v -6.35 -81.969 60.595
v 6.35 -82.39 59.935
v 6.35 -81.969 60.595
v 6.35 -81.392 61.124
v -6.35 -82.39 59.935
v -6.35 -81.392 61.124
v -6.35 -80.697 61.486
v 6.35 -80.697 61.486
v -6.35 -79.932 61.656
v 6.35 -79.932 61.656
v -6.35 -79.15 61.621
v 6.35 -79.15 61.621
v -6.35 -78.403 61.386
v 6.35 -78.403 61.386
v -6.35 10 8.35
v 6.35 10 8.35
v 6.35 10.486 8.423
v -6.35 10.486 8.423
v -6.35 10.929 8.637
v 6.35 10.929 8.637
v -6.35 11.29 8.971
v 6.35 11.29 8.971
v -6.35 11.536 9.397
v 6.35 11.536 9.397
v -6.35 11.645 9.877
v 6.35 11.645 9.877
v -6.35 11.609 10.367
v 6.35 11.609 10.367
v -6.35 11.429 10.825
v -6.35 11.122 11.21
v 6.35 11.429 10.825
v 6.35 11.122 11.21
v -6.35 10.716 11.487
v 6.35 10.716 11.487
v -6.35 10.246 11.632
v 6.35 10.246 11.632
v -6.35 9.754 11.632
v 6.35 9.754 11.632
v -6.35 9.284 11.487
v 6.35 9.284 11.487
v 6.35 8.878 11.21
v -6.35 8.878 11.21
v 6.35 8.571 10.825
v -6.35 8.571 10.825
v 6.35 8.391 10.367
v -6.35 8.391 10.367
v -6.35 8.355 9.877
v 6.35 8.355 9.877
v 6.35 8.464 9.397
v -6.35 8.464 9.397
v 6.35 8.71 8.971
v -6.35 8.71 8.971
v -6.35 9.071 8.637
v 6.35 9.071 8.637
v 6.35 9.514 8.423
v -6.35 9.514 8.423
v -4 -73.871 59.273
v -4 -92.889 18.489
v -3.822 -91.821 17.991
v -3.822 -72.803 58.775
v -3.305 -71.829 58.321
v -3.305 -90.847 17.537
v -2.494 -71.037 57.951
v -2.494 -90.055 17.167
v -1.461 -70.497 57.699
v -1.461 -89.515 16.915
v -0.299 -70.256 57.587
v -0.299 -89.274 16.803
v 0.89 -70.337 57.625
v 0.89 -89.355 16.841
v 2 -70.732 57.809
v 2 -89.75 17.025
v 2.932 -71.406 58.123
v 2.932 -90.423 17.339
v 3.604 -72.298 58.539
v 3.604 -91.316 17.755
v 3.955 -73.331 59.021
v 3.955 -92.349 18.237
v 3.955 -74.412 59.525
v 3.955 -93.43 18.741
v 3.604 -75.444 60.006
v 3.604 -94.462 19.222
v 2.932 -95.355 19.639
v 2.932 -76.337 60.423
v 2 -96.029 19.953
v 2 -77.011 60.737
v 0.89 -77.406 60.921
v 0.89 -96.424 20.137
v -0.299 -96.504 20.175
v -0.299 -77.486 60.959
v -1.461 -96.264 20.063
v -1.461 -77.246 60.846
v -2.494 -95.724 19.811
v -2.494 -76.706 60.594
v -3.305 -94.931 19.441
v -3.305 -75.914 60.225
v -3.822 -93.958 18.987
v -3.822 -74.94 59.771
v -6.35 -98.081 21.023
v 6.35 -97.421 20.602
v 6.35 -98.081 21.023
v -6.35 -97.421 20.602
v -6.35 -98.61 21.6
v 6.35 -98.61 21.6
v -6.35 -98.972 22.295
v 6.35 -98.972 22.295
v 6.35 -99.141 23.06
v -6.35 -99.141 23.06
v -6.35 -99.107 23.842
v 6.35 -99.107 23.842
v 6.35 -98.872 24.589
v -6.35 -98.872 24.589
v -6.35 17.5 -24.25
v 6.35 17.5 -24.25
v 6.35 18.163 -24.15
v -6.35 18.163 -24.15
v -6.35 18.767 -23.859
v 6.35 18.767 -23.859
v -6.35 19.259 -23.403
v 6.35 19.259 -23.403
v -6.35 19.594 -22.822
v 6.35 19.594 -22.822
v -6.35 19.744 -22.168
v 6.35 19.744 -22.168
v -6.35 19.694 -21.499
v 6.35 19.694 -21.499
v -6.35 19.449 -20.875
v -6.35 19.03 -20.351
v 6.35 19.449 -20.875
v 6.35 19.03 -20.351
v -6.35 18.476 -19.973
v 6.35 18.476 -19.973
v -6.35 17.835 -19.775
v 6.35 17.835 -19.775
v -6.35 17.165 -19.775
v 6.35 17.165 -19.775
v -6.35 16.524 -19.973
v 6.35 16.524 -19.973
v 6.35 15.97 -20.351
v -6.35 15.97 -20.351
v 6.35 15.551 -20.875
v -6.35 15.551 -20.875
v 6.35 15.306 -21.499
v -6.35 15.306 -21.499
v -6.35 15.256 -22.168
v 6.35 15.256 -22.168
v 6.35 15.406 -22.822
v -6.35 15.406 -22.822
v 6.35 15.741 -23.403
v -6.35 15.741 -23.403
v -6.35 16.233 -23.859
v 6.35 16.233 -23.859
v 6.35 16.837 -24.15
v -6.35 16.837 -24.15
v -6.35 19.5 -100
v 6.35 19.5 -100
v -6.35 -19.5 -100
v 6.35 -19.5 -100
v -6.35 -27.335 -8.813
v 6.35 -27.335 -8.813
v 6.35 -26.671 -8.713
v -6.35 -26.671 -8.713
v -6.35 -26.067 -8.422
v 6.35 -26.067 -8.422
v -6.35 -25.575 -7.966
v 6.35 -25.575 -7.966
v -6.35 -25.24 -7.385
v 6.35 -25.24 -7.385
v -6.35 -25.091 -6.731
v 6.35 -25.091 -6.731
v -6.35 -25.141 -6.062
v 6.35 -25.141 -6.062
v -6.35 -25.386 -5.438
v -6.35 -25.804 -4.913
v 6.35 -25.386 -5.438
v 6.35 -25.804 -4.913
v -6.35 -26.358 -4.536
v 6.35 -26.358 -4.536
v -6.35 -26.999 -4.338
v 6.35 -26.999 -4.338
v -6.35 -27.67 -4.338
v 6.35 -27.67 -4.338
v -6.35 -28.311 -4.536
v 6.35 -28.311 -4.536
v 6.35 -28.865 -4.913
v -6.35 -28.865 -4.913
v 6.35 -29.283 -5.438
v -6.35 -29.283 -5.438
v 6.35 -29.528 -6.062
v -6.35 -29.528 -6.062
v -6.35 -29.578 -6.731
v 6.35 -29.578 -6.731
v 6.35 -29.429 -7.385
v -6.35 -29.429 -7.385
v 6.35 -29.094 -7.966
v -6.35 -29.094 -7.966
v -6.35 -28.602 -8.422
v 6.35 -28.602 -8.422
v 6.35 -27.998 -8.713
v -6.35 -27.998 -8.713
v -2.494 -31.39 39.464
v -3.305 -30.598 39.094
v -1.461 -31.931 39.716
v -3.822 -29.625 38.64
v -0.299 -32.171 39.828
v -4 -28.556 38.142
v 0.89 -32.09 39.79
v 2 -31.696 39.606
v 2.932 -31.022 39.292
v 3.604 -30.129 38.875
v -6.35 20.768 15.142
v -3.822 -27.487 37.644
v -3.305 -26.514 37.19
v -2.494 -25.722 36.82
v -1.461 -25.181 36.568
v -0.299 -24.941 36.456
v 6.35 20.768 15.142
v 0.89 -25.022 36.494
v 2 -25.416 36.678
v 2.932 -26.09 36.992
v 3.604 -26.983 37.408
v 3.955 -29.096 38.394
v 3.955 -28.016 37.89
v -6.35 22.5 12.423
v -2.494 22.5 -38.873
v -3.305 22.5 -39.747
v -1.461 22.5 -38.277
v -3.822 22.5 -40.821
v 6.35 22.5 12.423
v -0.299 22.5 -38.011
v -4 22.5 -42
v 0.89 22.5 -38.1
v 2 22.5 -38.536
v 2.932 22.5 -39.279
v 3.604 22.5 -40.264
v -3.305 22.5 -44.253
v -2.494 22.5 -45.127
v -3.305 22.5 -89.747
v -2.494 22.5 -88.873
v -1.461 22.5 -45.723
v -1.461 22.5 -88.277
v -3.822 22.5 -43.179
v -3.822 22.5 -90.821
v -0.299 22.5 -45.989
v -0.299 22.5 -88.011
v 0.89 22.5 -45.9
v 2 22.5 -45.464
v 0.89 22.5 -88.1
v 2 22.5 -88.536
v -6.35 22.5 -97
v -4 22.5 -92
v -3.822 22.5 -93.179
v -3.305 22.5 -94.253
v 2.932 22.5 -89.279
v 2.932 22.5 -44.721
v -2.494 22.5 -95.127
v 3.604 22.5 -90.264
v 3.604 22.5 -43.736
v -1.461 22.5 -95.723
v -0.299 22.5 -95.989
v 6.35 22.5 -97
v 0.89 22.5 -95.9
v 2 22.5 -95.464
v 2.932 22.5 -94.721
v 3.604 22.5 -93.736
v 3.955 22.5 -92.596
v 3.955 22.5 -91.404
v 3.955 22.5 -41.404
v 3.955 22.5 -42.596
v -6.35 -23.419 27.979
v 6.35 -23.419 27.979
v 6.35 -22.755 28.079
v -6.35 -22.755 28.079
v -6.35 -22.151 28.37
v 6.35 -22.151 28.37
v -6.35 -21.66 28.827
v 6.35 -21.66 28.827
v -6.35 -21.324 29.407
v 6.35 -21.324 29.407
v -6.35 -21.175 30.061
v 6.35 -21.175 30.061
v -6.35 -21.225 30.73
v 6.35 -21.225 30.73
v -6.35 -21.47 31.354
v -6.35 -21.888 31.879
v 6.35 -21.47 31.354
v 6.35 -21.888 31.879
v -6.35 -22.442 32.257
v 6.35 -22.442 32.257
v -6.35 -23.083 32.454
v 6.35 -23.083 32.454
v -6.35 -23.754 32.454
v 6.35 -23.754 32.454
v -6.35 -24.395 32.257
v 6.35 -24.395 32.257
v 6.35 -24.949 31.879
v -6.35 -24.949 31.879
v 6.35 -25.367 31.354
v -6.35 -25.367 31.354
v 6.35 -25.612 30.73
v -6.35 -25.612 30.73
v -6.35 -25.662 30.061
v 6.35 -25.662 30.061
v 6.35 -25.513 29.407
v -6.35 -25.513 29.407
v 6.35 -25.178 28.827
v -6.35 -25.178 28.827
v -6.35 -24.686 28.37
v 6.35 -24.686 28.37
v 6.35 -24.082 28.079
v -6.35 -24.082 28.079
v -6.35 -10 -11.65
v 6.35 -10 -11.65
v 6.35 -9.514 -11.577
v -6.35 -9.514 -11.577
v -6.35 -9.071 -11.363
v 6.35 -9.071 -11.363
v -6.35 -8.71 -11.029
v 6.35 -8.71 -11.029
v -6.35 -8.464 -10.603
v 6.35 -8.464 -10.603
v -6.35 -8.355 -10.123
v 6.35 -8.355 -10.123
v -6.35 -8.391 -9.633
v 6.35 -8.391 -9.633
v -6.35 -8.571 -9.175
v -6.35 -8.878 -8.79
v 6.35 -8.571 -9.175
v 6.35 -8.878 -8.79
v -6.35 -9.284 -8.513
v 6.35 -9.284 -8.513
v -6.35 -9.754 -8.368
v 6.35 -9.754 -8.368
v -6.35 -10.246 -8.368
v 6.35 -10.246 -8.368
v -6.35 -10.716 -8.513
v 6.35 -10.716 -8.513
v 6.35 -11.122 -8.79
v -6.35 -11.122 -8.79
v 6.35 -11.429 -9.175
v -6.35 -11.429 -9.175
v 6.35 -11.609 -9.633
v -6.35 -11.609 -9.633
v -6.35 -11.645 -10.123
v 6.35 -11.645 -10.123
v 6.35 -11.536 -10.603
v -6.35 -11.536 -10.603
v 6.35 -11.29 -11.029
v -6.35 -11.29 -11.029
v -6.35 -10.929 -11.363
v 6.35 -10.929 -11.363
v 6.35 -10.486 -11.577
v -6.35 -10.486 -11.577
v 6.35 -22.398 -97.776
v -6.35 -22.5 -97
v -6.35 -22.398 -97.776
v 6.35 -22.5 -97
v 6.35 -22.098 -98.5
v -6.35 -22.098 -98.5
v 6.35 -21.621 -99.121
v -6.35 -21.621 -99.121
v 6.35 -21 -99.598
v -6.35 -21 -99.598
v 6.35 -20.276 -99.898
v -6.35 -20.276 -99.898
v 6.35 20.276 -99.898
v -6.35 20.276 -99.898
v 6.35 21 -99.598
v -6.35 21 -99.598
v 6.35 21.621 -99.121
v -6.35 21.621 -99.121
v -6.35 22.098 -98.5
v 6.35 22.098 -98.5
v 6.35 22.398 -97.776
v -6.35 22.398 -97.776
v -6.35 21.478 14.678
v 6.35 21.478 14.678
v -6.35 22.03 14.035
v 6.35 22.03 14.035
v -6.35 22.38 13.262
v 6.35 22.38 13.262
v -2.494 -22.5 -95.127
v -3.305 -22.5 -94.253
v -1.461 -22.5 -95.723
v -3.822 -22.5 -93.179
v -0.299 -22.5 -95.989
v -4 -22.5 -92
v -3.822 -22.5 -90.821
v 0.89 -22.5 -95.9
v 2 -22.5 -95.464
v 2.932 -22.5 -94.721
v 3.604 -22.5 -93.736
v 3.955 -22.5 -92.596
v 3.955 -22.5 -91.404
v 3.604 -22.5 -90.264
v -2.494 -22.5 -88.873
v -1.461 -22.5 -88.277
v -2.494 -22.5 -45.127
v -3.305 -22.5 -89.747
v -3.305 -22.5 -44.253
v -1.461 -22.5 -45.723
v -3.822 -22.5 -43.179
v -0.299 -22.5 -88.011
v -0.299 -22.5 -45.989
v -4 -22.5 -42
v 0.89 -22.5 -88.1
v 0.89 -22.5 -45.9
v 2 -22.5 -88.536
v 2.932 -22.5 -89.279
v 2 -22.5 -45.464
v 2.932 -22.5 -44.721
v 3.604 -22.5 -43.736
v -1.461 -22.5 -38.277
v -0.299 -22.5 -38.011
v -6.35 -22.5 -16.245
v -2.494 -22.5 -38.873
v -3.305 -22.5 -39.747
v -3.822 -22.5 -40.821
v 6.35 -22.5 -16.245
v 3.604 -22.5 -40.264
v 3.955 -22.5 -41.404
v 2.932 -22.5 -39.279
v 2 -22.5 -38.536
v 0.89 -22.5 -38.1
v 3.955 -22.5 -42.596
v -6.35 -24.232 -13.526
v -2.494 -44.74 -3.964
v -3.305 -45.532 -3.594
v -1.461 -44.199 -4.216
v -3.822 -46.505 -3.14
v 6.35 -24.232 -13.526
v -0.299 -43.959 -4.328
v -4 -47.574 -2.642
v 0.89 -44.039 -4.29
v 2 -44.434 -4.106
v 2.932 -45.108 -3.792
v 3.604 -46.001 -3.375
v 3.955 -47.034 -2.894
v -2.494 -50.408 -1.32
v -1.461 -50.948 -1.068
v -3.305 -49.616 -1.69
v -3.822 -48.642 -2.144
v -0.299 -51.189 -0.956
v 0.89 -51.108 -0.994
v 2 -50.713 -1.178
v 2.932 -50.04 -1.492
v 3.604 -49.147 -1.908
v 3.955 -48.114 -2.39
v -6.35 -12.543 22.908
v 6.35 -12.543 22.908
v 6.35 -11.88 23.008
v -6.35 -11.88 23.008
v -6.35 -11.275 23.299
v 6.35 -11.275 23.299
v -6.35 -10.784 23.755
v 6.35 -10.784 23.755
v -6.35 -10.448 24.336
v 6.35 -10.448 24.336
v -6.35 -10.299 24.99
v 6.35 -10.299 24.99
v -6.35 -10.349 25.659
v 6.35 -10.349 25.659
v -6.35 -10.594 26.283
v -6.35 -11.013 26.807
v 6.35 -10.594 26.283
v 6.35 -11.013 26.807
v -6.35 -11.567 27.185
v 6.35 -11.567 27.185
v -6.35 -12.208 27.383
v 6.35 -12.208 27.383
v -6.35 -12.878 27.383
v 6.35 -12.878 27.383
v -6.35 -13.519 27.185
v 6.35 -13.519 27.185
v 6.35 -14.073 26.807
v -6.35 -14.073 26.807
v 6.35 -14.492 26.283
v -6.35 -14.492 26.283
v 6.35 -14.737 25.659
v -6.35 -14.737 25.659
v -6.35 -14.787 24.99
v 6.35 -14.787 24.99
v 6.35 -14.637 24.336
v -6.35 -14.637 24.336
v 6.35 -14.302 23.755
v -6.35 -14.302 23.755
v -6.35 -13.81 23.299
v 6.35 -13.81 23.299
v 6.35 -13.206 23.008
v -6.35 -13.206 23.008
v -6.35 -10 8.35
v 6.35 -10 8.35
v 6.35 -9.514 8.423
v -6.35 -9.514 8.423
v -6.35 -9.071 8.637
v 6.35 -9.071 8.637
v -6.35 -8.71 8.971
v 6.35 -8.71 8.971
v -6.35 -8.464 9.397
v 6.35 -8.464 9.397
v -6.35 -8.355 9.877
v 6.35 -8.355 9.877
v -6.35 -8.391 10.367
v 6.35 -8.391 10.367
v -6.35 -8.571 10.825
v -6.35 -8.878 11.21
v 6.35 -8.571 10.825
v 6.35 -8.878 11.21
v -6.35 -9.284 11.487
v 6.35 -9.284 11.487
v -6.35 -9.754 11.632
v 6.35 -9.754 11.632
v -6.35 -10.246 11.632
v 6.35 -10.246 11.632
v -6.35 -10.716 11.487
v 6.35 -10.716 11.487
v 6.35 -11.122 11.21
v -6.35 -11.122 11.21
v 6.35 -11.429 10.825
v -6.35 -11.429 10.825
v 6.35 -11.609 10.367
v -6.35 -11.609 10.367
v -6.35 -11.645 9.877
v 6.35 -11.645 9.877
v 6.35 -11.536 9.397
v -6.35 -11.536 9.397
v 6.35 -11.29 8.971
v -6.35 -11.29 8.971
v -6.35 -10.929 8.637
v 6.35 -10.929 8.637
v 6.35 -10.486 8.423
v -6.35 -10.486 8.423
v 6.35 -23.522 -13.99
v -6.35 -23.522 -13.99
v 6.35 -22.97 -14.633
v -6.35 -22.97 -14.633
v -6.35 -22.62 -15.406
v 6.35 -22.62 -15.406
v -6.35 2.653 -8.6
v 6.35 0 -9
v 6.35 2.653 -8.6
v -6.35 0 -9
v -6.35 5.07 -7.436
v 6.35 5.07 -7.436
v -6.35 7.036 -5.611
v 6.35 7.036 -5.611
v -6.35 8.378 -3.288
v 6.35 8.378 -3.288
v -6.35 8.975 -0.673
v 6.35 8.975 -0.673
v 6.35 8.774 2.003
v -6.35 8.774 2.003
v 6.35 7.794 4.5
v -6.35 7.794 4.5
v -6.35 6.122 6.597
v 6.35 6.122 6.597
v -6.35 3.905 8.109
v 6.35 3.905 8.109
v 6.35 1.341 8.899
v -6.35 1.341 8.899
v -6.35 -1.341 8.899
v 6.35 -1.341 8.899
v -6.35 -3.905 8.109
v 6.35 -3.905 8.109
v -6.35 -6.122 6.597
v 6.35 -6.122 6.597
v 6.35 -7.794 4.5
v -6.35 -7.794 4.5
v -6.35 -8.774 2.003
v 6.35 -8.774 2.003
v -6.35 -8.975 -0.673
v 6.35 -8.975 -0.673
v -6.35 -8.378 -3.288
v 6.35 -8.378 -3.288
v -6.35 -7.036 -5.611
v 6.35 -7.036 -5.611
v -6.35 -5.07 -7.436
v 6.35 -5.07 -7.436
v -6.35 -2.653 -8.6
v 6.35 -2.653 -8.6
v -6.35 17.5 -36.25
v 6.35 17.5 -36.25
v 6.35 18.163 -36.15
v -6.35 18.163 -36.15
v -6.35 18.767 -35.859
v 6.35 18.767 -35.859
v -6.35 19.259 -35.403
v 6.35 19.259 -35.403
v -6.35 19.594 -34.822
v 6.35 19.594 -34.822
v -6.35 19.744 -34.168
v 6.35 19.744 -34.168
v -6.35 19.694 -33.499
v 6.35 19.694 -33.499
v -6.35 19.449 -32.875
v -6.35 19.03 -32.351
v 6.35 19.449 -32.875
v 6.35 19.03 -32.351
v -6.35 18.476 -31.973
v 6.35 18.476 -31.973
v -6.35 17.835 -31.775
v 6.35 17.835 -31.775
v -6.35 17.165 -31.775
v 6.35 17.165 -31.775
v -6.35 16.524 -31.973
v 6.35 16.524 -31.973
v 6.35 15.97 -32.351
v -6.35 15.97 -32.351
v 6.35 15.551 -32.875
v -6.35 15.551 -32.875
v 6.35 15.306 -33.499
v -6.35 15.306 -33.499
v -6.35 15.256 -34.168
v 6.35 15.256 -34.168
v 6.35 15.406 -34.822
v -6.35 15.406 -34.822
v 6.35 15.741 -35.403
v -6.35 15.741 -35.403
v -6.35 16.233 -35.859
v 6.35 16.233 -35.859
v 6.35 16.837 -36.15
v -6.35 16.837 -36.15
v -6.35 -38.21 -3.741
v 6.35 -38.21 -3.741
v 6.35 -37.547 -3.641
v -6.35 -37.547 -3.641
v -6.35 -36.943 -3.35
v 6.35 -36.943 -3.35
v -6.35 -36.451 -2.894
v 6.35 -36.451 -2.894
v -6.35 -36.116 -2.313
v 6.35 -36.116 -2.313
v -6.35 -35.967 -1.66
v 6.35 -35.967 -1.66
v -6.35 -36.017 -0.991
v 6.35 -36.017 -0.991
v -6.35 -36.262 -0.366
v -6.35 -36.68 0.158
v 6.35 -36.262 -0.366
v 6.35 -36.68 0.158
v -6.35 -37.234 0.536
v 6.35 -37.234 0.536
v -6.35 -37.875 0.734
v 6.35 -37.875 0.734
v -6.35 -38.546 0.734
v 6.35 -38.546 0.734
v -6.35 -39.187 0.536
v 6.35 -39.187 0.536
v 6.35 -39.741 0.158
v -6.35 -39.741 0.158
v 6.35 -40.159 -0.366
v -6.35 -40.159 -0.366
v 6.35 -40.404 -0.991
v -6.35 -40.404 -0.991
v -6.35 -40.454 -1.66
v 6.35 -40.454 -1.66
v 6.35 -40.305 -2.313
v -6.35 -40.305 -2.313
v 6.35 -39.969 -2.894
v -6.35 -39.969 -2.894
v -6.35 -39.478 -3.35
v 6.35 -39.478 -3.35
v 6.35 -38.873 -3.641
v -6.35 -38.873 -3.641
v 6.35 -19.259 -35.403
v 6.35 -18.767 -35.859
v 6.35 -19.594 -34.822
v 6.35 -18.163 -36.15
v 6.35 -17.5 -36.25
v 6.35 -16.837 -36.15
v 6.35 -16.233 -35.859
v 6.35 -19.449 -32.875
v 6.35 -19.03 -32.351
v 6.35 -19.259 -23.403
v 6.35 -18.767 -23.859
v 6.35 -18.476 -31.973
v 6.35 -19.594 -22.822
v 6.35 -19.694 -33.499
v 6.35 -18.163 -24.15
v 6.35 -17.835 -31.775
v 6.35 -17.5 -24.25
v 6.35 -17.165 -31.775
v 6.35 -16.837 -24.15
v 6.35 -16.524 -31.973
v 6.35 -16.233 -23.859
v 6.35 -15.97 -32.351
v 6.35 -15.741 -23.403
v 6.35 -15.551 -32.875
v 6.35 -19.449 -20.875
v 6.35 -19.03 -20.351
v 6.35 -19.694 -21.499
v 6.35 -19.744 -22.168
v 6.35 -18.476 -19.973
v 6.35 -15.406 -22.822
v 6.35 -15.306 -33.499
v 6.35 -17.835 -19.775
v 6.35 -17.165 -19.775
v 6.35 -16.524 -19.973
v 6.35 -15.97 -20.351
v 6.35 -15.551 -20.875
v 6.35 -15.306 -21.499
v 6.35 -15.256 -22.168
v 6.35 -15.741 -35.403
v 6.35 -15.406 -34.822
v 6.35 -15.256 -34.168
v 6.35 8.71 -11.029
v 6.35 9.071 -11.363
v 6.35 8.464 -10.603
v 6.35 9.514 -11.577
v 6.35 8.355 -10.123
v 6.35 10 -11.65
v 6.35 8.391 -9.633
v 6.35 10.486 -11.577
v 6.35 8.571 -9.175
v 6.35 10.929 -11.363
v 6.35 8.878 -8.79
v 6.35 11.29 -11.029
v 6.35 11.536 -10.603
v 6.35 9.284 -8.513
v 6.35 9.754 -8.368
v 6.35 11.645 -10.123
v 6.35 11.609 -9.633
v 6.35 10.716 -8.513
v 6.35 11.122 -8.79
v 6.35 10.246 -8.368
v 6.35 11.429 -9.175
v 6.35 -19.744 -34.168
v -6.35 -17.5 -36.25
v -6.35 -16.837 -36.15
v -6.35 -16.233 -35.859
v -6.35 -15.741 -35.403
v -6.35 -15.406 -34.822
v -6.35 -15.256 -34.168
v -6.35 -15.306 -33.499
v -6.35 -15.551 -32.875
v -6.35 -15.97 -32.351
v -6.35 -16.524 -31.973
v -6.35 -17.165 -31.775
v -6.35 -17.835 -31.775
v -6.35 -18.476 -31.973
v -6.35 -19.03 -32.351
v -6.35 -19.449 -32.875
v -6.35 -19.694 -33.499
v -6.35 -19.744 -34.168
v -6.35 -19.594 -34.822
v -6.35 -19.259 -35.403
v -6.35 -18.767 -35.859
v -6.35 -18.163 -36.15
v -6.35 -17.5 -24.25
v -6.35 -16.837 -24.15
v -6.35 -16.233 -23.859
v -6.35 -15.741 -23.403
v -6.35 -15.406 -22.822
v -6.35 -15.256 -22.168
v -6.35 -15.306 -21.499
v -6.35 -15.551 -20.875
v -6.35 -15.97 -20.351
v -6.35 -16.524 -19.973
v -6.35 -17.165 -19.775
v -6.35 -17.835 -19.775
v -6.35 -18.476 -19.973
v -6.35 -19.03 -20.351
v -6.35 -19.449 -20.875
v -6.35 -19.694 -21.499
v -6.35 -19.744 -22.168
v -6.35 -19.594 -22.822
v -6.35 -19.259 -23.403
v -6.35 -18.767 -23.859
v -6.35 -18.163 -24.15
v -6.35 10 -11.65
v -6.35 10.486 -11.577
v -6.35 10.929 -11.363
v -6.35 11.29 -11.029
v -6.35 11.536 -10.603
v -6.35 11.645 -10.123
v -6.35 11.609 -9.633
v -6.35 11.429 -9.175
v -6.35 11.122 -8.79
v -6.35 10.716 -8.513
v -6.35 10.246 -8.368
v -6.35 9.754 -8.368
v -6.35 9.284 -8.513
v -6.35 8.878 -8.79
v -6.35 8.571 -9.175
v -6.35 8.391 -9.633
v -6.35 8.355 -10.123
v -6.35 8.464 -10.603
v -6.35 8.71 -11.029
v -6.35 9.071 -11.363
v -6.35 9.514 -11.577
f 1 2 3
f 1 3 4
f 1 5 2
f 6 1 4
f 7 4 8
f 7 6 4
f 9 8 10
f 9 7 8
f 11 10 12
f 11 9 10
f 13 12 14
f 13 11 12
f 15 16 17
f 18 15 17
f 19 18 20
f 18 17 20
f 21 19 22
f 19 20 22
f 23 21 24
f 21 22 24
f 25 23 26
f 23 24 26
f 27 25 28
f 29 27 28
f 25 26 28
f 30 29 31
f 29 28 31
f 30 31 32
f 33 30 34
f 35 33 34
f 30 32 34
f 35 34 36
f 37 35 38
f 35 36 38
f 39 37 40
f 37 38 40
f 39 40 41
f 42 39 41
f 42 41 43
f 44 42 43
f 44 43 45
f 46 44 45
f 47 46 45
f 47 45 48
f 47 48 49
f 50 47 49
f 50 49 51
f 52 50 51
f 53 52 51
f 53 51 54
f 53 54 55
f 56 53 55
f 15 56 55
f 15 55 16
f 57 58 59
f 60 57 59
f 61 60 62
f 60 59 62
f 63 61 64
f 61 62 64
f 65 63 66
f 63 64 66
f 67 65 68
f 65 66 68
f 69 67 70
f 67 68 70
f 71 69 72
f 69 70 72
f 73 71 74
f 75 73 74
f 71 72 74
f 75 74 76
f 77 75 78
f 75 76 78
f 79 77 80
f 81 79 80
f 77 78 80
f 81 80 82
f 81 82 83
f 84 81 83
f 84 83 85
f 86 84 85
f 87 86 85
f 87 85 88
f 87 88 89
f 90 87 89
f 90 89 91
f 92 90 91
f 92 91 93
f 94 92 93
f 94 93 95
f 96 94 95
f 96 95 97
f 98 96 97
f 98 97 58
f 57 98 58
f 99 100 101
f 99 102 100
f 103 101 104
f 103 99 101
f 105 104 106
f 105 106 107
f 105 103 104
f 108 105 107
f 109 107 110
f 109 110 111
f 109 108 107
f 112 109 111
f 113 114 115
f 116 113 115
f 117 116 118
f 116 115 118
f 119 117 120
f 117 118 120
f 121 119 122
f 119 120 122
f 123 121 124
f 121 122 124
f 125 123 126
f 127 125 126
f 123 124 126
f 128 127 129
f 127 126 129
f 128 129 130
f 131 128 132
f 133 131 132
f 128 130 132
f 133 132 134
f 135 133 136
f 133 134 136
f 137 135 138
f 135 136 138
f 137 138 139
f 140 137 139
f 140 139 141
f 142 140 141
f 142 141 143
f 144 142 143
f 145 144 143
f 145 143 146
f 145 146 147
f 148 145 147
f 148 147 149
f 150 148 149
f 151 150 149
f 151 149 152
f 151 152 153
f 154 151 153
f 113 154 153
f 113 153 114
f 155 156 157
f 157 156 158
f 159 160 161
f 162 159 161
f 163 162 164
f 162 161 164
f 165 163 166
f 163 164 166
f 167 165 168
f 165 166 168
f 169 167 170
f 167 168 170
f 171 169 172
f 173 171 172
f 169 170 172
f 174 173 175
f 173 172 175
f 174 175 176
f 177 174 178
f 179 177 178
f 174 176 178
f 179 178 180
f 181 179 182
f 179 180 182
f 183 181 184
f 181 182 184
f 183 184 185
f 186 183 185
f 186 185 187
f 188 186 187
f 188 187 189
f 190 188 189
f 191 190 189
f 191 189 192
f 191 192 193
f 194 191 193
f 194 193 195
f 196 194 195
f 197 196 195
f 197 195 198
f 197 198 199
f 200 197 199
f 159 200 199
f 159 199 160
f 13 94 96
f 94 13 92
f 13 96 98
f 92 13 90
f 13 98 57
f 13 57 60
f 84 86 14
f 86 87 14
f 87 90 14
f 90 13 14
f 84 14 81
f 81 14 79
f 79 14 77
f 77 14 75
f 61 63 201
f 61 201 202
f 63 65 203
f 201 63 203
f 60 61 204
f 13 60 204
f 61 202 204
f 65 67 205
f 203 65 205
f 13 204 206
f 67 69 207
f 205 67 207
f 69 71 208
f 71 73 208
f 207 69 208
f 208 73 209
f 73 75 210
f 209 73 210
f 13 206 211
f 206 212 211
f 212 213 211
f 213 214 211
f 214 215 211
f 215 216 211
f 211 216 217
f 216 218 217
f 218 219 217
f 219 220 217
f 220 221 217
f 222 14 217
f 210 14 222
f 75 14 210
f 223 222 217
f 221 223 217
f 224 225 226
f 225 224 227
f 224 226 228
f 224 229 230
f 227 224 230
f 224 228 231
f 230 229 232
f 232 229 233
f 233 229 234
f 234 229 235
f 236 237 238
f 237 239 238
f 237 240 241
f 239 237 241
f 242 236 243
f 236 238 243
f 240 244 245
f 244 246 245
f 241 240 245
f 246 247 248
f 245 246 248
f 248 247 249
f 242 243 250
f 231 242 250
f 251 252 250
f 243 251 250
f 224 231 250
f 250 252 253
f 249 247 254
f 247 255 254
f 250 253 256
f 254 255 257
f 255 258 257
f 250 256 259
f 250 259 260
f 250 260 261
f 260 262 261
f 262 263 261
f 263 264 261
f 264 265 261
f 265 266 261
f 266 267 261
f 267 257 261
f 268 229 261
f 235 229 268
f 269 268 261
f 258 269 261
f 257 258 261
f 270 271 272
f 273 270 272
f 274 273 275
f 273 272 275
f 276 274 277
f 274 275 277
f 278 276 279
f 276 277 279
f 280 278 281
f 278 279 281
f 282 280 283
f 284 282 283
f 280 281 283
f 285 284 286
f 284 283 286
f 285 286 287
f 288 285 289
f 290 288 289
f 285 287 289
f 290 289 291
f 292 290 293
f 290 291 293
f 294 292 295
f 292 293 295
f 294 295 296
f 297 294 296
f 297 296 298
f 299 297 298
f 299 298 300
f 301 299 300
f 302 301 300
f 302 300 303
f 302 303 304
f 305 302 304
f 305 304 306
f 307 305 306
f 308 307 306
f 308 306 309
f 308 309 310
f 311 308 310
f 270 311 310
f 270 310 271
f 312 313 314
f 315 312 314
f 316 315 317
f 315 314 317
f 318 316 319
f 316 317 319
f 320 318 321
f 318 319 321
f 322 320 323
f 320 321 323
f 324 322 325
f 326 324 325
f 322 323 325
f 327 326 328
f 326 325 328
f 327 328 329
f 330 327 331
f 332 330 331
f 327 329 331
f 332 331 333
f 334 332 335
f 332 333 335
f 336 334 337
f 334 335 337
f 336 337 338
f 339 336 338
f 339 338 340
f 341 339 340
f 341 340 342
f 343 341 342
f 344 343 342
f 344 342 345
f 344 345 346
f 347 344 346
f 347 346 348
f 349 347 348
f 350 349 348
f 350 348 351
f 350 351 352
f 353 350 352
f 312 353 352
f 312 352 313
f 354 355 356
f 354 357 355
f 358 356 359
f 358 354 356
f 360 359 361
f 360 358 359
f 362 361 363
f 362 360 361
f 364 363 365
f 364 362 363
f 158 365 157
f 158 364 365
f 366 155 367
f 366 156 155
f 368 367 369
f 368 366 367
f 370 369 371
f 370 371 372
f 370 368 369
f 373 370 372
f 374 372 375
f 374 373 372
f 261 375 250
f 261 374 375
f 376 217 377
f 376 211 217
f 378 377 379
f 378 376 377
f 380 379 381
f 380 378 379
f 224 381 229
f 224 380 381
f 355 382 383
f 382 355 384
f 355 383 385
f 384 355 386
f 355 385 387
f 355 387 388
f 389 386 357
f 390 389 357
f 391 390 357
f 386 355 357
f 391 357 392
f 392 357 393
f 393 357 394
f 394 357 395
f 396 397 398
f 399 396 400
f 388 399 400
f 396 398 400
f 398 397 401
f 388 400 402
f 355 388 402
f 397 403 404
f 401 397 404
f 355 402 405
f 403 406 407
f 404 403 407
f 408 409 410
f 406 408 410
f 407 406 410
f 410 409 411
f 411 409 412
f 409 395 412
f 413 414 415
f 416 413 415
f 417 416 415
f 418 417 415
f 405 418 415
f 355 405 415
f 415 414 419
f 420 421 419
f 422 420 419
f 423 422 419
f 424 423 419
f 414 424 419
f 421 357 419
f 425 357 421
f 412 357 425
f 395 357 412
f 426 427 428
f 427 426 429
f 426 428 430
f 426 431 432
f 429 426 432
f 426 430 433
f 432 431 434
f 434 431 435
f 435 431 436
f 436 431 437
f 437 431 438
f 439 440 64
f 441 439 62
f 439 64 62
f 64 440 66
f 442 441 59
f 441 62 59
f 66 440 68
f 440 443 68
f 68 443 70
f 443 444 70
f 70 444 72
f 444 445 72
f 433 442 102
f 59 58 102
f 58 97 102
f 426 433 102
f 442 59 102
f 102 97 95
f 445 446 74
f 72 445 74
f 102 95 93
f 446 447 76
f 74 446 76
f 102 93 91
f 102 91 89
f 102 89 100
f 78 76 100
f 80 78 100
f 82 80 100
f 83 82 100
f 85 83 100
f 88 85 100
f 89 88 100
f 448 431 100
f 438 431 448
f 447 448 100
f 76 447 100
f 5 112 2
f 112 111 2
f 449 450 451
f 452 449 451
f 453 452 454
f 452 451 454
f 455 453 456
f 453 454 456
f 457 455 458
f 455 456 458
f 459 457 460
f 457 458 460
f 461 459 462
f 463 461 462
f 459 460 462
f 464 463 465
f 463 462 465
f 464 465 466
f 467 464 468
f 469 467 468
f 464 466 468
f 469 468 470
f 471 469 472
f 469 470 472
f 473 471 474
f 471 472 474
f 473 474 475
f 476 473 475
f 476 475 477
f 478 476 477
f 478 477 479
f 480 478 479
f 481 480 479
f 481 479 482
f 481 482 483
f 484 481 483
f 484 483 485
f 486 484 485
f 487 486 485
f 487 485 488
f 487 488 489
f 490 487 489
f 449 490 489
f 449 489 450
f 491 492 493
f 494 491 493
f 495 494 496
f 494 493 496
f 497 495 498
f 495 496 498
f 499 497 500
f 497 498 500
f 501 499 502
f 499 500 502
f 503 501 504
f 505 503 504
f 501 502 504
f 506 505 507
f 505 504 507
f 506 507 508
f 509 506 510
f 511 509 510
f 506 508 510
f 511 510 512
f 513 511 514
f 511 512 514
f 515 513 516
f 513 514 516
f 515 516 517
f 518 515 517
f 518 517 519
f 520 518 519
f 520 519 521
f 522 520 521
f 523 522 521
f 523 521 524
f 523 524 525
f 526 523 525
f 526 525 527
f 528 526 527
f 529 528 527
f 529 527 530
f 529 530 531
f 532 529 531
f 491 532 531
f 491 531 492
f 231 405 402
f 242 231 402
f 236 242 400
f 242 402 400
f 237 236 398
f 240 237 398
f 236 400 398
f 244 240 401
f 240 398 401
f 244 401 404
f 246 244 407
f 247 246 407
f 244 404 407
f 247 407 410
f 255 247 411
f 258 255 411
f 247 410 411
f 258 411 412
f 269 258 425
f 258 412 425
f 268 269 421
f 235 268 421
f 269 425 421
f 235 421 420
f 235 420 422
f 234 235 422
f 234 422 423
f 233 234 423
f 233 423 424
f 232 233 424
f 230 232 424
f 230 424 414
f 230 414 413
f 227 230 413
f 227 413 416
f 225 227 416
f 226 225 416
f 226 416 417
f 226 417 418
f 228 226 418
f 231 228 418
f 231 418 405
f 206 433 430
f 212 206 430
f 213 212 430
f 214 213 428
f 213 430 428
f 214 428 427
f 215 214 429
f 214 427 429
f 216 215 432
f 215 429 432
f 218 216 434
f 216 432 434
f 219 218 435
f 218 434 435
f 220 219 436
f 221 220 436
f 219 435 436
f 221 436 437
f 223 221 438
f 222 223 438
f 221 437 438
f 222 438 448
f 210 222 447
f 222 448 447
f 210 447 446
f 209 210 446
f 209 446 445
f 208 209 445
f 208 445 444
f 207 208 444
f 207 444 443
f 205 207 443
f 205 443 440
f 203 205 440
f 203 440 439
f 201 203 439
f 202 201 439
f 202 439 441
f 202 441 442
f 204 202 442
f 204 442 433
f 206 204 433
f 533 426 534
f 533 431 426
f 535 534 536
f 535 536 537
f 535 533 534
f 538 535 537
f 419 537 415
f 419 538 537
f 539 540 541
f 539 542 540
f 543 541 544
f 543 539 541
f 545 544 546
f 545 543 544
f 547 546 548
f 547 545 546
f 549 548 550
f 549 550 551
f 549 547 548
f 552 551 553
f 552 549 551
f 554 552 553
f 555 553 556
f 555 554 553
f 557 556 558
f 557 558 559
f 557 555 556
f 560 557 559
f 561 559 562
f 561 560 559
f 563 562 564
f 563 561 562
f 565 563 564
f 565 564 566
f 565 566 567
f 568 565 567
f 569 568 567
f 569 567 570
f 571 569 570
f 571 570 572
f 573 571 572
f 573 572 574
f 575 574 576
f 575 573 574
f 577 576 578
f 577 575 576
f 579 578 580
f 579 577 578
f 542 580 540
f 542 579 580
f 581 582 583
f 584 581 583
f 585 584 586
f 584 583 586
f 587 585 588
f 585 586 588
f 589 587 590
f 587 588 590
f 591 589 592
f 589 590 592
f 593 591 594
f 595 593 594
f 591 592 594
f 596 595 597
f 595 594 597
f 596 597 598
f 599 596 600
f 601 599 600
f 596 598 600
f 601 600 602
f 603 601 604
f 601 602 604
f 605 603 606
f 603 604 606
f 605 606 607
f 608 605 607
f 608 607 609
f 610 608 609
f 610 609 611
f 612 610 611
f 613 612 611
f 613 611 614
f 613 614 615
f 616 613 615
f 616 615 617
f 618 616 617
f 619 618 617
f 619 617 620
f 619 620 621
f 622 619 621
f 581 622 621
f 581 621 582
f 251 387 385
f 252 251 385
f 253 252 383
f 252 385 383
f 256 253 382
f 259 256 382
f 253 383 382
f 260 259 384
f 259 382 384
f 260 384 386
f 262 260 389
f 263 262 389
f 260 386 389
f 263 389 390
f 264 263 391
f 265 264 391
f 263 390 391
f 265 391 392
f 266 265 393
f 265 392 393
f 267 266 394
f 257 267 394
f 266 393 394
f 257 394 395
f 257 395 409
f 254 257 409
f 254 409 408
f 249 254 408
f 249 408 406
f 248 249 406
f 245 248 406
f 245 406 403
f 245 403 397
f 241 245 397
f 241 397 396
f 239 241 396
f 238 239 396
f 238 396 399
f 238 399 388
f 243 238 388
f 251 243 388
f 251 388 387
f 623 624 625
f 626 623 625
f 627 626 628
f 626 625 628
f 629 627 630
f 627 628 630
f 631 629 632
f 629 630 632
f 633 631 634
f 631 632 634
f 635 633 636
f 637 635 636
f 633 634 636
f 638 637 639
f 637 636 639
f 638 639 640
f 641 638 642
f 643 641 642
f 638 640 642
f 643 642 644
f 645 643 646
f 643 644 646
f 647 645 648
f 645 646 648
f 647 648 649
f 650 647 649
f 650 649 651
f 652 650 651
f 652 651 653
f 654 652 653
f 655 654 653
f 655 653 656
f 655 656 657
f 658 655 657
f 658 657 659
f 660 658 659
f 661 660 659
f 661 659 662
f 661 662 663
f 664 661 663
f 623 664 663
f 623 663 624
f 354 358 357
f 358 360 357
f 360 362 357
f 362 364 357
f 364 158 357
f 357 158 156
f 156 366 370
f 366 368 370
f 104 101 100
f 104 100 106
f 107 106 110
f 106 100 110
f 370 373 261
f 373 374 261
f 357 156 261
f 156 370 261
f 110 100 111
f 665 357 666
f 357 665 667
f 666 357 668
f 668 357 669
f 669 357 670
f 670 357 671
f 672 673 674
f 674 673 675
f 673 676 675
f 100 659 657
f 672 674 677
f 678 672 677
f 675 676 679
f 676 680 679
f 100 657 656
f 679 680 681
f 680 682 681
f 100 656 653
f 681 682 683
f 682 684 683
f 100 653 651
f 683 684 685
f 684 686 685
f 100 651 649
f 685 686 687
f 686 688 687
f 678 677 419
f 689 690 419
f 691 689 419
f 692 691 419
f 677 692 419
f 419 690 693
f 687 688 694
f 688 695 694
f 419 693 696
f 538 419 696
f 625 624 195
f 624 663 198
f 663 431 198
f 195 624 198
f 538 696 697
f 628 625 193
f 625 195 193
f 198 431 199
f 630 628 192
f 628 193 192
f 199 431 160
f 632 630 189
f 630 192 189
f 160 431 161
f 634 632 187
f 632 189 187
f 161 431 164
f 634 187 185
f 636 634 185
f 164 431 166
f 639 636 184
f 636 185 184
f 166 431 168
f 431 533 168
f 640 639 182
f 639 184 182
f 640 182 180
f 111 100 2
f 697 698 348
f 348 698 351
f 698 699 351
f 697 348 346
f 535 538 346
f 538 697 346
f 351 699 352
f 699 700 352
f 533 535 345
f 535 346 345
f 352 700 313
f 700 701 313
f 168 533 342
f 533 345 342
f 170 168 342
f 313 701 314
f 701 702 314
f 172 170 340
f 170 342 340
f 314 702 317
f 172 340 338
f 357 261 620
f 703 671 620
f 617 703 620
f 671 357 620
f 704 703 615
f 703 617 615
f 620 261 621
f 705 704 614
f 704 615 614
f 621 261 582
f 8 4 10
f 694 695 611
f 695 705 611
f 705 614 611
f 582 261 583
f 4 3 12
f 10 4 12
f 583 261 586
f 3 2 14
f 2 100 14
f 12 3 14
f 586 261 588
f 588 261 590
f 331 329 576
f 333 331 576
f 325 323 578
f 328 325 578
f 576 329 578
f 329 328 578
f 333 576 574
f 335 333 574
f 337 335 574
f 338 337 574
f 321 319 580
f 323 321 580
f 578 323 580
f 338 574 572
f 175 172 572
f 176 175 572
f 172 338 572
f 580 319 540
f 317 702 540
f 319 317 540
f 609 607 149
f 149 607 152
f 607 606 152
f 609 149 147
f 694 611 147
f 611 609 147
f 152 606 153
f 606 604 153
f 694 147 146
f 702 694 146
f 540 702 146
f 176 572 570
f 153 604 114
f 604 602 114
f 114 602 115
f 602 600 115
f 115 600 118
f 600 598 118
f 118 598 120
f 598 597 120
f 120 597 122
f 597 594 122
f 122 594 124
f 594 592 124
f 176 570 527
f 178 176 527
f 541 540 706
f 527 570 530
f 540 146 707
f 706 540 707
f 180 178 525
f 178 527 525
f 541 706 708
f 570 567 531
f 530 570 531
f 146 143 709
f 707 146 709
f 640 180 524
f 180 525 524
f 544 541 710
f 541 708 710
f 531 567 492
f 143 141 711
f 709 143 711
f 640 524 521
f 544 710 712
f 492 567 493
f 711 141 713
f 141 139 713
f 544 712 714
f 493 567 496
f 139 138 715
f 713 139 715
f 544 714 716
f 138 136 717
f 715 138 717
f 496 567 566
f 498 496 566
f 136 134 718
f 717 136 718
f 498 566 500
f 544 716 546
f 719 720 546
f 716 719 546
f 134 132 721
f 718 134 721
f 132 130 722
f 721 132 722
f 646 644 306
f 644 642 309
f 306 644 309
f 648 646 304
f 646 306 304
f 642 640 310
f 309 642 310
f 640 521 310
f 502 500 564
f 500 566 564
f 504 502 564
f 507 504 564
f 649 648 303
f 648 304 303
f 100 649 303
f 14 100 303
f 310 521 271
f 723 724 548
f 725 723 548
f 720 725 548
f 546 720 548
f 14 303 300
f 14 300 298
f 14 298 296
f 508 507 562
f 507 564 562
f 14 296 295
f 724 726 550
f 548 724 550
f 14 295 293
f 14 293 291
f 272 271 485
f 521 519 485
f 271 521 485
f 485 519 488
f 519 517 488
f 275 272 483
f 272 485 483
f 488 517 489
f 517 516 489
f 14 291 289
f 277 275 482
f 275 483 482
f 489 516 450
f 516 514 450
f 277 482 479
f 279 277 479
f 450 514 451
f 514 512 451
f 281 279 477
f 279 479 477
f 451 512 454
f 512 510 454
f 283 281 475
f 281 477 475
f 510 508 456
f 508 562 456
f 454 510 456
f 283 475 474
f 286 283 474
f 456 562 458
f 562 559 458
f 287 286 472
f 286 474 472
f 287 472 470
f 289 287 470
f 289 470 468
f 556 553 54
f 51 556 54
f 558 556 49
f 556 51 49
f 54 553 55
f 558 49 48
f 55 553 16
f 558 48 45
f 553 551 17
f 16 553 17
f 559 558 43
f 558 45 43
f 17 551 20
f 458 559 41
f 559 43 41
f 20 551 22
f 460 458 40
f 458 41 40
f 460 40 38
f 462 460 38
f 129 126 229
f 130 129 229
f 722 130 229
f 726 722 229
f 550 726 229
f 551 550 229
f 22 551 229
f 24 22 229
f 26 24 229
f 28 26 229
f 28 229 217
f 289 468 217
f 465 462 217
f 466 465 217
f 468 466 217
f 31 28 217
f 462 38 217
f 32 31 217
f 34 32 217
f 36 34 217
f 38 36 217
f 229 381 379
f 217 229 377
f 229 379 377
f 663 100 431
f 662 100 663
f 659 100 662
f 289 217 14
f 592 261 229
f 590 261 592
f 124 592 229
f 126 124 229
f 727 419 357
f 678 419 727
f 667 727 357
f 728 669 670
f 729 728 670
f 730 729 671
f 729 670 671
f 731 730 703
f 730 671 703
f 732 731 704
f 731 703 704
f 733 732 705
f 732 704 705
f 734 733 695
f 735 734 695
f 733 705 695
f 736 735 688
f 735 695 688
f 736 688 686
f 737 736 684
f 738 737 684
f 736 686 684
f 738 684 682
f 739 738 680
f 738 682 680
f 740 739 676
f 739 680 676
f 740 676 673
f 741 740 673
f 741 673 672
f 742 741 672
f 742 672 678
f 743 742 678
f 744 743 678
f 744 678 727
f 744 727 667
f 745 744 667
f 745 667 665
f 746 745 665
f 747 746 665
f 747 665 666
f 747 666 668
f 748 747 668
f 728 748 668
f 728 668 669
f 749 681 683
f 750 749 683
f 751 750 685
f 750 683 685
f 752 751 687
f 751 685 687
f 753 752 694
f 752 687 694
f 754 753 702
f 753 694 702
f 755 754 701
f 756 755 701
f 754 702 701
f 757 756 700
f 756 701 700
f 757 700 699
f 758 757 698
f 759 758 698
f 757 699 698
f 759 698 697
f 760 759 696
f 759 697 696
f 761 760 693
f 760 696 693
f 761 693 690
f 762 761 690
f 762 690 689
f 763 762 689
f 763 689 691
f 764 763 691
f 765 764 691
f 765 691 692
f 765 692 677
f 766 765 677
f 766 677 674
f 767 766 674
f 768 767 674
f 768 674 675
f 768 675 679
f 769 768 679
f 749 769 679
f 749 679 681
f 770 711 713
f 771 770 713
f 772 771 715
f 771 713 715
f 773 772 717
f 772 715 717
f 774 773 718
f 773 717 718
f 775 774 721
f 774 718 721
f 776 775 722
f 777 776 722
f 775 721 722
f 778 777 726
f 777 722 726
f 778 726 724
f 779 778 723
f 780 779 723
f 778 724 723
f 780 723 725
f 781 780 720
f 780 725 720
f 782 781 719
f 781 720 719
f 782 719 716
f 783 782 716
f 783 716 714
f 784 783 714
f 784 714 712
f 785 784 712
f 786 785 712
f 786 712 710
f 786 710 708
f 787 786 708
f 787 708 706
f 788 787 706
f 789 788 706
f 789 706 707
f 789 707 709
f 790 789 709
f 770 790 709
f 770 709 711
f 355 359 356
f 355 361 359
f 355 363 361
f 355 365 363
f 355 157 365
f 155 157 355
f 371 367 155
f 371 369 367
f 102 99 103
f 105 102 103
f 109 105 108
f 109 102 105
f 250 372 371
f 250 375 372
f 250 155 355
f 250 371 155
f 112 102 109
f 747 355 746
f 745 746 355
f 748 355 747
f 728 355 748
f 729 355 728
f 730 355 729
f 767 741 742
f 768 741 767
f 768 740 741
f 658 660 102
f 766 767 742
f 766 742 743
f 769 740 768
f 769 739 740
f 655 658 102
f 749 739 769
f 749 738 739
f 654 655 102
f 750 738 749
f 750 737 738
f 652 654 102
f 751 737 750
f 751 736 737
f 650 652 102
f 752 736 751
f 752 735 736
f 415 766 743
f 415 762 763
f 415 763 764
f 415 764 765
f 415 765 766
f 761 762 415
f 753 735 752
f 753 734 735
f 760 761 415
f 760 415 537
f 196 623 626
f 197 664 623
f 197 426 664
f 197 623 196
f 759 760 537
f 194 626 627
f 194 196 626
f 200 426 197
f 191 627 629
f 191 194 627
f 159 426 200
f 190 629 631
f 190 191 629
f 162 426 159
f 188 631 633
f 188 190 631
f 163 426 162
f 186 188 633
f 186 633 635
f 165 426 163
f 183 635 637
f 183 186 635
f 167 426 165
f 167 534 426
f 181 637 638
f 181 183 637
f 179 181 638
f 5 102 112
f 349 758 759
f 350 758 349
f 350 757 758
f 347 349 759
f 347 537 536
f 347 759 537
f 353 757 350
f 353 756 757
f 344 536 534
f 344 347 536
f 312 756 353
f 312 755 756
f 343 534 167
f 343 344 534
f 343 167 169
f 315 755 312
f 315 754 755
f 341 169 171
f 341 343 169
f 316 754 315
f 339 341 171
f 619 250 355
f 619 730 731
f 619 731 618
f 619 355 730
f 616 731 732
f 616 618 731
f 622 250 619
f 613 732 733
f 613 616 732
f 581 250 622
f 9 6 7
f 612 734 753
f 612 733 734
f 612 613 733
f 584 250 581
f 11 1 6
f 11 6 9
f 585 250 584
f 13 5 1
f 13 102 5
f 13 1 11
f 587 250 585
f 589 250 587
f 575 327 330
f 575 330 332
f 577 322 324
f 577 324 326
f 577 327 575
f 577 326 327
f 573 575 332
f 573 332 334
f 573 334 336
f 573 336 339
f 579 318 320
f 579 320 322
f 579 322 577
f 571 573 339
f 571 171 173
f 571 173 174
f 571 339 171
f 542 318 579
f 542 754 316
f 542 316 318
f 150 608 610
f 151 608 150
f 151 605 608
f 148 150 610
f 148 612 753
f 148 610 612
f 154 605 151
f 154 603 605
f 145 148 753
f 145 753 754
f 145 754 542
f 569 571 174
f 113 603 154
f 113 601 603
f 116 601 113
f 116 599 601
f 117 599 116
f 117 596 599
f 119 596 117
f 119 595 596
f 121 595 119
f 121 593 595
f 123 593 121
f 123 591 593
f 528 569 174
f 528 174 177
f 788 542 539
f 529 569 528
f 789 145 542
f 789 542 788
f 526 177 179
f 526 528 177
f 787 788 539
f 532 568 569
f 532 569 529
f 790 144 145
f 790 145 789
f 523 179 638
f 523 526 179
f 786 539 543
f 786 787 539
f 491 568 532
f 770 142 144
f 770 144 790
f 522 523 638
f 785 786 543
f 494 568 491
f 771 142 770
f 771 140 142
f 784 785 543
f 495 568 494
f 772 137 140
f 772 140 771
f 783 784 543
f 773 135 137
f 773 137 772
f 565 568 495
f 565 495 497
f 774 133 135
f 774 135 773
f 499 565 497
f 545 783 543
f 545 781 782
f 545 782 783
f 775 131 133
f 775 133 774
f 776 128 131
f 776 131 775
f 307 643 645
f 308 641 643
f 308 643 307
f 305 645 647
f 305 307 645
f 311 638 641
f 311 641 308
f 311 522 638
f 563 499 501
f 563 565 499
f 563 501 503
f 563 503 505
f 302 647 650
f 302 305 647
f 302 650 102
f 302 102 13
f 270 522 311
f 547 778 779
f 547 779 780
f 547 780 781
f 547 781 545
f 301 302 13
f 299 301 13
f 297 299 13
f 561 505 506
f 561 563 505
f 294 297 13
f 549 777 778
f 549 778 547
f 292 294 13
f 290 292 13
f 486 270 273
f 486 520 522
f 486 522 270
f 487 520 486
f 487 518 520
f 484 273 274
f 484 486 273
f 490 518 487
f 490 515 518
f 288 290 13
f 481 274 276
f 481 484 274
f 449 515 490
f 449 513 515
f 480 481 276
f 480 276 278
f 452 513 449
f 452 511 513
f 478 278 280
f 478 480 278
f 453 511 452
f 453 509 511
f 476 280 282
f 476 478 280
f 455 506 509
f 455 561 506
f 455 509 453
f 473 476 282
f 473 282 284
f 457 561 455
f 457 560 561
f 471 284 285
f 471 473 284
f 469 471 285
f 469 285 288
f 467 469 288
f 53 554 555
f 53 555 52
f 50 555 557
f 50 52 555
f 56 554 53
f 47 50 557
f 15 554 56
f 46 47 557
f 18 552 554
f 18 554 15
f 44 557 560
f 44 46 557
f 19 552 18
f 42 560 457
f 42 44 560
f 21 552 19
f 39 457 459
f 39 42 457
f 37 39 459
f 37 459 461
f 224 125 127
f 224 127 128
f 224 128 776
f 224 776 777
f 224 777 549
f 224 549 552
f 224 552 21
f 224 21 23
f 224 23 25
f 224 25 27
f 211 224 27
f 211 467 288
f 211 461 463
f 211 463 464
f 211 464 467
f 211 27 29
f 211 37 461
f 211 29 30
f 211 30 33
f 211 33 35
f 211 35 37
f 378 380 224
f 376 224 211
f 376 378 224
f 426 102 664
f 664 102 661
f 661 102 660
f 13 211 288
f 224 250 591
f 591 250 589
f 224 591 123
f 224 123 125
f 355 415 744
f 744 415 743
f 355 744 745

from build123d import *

# Parameters (mm, degrees)
CROQUIS1_R                    = 9
SALIENTE_EXTRUIR1_DEPTH       = 6.35
DI_METRO_DE_TALADRO_5_0_5_1_D = 8
DI_METRO_DE_TALADRO_5_0_5_2_D = 8
REDONDEO1_R                   = 3
TALADRO_ROSCADO_M4X0_71_D     = 3.3
TALADRO_DE_MARGEN_PARA_M41_D  = 4.5


with BuildPart() as part:
    # Croquis1 → Saliente-Extruir1 (new, symmetric)
    with BuildSketch(Plane(origin=(0, 0, 0), x_dir=(0, 0, -1), z_dir=(1, 0, 0))):
        Polygon((14.334080868, -22.5), (-21.869900966, -100.139689593), (-62.653751382, -81.121867814), (-14.334080868, 22.5), (100, 22.5), (100, -22.5), align=None)
        Circle(CROQUIS1_R, mode=Mode.SUBTRACT)
    extrude(amount=SALIENTE_EXTRUIR1_DEPTH, both=True)

    # Diámetro de taladro Ø5.0 (5)1 (through all)
    with Locations(Plane(origin=(0, 22.5, 0), x_dir=(1, 0, 0), z_dir=(0, 1, 0))):
        with Locations((0, 92), (0, 42)):
            Hole(DI_METRO_DE_TALADRO_5_0_5_1_D / 2)

    # Diámetro de taladro Ø5.0 (5)2 (through all)
    with Locations(Plane(origin=(0, 9.508910889, 20.391925208), x_dir=(1, 0, 0), z_dir=(0, 0.4226182617407033, 0.9063077870366483))):
        with Locations((0, -42), (0, -92)):
            Hole(DI_METRO_DE_TALADRO_5_0_5_2_D / 2)

    # Redondeo1
    redondeo1_edges = [part.edges().sort_by_distance(p)[0] for p in [
        (0, -22.5, -14.334080868),
        (0, -100.139689593, 21.869900966),
        (0, -81.121867814, 62.653751382),
        (0, 22.5, 14.334080868),
        (0, 22.5, -100),
        (0, -22.5, -100),
    ]]
    fillet(redondeo1_edges, radius=REDONDEO1_R)

    # Taladro roscado M4x0.71 (through all)
    with Locations(Plane.ZY.offset(6.35)):
        with Locations((10, 10), (-10, 10), (-10, -10), (10, -10)):
            Hole(TALADRO_ROSCADO_M4X0_71_D / 2)

    # Taladro de margen para M41 (through all)
    with Locations(Plane.ZY.offset(6.35)):
        with Locations((-6.562784515, -27.334590895), (-1.491365374, -38.21028434), (25.157988031, -12.542951734), (30.229407172, -23.418645179), (-22, 17.5), (-22, -17.5), (-34, 17.5), (-34, -17.5)):
            Hole(TALADRO_DE_MARGEN_PARA_M41_D / 2)


solid = part.part
